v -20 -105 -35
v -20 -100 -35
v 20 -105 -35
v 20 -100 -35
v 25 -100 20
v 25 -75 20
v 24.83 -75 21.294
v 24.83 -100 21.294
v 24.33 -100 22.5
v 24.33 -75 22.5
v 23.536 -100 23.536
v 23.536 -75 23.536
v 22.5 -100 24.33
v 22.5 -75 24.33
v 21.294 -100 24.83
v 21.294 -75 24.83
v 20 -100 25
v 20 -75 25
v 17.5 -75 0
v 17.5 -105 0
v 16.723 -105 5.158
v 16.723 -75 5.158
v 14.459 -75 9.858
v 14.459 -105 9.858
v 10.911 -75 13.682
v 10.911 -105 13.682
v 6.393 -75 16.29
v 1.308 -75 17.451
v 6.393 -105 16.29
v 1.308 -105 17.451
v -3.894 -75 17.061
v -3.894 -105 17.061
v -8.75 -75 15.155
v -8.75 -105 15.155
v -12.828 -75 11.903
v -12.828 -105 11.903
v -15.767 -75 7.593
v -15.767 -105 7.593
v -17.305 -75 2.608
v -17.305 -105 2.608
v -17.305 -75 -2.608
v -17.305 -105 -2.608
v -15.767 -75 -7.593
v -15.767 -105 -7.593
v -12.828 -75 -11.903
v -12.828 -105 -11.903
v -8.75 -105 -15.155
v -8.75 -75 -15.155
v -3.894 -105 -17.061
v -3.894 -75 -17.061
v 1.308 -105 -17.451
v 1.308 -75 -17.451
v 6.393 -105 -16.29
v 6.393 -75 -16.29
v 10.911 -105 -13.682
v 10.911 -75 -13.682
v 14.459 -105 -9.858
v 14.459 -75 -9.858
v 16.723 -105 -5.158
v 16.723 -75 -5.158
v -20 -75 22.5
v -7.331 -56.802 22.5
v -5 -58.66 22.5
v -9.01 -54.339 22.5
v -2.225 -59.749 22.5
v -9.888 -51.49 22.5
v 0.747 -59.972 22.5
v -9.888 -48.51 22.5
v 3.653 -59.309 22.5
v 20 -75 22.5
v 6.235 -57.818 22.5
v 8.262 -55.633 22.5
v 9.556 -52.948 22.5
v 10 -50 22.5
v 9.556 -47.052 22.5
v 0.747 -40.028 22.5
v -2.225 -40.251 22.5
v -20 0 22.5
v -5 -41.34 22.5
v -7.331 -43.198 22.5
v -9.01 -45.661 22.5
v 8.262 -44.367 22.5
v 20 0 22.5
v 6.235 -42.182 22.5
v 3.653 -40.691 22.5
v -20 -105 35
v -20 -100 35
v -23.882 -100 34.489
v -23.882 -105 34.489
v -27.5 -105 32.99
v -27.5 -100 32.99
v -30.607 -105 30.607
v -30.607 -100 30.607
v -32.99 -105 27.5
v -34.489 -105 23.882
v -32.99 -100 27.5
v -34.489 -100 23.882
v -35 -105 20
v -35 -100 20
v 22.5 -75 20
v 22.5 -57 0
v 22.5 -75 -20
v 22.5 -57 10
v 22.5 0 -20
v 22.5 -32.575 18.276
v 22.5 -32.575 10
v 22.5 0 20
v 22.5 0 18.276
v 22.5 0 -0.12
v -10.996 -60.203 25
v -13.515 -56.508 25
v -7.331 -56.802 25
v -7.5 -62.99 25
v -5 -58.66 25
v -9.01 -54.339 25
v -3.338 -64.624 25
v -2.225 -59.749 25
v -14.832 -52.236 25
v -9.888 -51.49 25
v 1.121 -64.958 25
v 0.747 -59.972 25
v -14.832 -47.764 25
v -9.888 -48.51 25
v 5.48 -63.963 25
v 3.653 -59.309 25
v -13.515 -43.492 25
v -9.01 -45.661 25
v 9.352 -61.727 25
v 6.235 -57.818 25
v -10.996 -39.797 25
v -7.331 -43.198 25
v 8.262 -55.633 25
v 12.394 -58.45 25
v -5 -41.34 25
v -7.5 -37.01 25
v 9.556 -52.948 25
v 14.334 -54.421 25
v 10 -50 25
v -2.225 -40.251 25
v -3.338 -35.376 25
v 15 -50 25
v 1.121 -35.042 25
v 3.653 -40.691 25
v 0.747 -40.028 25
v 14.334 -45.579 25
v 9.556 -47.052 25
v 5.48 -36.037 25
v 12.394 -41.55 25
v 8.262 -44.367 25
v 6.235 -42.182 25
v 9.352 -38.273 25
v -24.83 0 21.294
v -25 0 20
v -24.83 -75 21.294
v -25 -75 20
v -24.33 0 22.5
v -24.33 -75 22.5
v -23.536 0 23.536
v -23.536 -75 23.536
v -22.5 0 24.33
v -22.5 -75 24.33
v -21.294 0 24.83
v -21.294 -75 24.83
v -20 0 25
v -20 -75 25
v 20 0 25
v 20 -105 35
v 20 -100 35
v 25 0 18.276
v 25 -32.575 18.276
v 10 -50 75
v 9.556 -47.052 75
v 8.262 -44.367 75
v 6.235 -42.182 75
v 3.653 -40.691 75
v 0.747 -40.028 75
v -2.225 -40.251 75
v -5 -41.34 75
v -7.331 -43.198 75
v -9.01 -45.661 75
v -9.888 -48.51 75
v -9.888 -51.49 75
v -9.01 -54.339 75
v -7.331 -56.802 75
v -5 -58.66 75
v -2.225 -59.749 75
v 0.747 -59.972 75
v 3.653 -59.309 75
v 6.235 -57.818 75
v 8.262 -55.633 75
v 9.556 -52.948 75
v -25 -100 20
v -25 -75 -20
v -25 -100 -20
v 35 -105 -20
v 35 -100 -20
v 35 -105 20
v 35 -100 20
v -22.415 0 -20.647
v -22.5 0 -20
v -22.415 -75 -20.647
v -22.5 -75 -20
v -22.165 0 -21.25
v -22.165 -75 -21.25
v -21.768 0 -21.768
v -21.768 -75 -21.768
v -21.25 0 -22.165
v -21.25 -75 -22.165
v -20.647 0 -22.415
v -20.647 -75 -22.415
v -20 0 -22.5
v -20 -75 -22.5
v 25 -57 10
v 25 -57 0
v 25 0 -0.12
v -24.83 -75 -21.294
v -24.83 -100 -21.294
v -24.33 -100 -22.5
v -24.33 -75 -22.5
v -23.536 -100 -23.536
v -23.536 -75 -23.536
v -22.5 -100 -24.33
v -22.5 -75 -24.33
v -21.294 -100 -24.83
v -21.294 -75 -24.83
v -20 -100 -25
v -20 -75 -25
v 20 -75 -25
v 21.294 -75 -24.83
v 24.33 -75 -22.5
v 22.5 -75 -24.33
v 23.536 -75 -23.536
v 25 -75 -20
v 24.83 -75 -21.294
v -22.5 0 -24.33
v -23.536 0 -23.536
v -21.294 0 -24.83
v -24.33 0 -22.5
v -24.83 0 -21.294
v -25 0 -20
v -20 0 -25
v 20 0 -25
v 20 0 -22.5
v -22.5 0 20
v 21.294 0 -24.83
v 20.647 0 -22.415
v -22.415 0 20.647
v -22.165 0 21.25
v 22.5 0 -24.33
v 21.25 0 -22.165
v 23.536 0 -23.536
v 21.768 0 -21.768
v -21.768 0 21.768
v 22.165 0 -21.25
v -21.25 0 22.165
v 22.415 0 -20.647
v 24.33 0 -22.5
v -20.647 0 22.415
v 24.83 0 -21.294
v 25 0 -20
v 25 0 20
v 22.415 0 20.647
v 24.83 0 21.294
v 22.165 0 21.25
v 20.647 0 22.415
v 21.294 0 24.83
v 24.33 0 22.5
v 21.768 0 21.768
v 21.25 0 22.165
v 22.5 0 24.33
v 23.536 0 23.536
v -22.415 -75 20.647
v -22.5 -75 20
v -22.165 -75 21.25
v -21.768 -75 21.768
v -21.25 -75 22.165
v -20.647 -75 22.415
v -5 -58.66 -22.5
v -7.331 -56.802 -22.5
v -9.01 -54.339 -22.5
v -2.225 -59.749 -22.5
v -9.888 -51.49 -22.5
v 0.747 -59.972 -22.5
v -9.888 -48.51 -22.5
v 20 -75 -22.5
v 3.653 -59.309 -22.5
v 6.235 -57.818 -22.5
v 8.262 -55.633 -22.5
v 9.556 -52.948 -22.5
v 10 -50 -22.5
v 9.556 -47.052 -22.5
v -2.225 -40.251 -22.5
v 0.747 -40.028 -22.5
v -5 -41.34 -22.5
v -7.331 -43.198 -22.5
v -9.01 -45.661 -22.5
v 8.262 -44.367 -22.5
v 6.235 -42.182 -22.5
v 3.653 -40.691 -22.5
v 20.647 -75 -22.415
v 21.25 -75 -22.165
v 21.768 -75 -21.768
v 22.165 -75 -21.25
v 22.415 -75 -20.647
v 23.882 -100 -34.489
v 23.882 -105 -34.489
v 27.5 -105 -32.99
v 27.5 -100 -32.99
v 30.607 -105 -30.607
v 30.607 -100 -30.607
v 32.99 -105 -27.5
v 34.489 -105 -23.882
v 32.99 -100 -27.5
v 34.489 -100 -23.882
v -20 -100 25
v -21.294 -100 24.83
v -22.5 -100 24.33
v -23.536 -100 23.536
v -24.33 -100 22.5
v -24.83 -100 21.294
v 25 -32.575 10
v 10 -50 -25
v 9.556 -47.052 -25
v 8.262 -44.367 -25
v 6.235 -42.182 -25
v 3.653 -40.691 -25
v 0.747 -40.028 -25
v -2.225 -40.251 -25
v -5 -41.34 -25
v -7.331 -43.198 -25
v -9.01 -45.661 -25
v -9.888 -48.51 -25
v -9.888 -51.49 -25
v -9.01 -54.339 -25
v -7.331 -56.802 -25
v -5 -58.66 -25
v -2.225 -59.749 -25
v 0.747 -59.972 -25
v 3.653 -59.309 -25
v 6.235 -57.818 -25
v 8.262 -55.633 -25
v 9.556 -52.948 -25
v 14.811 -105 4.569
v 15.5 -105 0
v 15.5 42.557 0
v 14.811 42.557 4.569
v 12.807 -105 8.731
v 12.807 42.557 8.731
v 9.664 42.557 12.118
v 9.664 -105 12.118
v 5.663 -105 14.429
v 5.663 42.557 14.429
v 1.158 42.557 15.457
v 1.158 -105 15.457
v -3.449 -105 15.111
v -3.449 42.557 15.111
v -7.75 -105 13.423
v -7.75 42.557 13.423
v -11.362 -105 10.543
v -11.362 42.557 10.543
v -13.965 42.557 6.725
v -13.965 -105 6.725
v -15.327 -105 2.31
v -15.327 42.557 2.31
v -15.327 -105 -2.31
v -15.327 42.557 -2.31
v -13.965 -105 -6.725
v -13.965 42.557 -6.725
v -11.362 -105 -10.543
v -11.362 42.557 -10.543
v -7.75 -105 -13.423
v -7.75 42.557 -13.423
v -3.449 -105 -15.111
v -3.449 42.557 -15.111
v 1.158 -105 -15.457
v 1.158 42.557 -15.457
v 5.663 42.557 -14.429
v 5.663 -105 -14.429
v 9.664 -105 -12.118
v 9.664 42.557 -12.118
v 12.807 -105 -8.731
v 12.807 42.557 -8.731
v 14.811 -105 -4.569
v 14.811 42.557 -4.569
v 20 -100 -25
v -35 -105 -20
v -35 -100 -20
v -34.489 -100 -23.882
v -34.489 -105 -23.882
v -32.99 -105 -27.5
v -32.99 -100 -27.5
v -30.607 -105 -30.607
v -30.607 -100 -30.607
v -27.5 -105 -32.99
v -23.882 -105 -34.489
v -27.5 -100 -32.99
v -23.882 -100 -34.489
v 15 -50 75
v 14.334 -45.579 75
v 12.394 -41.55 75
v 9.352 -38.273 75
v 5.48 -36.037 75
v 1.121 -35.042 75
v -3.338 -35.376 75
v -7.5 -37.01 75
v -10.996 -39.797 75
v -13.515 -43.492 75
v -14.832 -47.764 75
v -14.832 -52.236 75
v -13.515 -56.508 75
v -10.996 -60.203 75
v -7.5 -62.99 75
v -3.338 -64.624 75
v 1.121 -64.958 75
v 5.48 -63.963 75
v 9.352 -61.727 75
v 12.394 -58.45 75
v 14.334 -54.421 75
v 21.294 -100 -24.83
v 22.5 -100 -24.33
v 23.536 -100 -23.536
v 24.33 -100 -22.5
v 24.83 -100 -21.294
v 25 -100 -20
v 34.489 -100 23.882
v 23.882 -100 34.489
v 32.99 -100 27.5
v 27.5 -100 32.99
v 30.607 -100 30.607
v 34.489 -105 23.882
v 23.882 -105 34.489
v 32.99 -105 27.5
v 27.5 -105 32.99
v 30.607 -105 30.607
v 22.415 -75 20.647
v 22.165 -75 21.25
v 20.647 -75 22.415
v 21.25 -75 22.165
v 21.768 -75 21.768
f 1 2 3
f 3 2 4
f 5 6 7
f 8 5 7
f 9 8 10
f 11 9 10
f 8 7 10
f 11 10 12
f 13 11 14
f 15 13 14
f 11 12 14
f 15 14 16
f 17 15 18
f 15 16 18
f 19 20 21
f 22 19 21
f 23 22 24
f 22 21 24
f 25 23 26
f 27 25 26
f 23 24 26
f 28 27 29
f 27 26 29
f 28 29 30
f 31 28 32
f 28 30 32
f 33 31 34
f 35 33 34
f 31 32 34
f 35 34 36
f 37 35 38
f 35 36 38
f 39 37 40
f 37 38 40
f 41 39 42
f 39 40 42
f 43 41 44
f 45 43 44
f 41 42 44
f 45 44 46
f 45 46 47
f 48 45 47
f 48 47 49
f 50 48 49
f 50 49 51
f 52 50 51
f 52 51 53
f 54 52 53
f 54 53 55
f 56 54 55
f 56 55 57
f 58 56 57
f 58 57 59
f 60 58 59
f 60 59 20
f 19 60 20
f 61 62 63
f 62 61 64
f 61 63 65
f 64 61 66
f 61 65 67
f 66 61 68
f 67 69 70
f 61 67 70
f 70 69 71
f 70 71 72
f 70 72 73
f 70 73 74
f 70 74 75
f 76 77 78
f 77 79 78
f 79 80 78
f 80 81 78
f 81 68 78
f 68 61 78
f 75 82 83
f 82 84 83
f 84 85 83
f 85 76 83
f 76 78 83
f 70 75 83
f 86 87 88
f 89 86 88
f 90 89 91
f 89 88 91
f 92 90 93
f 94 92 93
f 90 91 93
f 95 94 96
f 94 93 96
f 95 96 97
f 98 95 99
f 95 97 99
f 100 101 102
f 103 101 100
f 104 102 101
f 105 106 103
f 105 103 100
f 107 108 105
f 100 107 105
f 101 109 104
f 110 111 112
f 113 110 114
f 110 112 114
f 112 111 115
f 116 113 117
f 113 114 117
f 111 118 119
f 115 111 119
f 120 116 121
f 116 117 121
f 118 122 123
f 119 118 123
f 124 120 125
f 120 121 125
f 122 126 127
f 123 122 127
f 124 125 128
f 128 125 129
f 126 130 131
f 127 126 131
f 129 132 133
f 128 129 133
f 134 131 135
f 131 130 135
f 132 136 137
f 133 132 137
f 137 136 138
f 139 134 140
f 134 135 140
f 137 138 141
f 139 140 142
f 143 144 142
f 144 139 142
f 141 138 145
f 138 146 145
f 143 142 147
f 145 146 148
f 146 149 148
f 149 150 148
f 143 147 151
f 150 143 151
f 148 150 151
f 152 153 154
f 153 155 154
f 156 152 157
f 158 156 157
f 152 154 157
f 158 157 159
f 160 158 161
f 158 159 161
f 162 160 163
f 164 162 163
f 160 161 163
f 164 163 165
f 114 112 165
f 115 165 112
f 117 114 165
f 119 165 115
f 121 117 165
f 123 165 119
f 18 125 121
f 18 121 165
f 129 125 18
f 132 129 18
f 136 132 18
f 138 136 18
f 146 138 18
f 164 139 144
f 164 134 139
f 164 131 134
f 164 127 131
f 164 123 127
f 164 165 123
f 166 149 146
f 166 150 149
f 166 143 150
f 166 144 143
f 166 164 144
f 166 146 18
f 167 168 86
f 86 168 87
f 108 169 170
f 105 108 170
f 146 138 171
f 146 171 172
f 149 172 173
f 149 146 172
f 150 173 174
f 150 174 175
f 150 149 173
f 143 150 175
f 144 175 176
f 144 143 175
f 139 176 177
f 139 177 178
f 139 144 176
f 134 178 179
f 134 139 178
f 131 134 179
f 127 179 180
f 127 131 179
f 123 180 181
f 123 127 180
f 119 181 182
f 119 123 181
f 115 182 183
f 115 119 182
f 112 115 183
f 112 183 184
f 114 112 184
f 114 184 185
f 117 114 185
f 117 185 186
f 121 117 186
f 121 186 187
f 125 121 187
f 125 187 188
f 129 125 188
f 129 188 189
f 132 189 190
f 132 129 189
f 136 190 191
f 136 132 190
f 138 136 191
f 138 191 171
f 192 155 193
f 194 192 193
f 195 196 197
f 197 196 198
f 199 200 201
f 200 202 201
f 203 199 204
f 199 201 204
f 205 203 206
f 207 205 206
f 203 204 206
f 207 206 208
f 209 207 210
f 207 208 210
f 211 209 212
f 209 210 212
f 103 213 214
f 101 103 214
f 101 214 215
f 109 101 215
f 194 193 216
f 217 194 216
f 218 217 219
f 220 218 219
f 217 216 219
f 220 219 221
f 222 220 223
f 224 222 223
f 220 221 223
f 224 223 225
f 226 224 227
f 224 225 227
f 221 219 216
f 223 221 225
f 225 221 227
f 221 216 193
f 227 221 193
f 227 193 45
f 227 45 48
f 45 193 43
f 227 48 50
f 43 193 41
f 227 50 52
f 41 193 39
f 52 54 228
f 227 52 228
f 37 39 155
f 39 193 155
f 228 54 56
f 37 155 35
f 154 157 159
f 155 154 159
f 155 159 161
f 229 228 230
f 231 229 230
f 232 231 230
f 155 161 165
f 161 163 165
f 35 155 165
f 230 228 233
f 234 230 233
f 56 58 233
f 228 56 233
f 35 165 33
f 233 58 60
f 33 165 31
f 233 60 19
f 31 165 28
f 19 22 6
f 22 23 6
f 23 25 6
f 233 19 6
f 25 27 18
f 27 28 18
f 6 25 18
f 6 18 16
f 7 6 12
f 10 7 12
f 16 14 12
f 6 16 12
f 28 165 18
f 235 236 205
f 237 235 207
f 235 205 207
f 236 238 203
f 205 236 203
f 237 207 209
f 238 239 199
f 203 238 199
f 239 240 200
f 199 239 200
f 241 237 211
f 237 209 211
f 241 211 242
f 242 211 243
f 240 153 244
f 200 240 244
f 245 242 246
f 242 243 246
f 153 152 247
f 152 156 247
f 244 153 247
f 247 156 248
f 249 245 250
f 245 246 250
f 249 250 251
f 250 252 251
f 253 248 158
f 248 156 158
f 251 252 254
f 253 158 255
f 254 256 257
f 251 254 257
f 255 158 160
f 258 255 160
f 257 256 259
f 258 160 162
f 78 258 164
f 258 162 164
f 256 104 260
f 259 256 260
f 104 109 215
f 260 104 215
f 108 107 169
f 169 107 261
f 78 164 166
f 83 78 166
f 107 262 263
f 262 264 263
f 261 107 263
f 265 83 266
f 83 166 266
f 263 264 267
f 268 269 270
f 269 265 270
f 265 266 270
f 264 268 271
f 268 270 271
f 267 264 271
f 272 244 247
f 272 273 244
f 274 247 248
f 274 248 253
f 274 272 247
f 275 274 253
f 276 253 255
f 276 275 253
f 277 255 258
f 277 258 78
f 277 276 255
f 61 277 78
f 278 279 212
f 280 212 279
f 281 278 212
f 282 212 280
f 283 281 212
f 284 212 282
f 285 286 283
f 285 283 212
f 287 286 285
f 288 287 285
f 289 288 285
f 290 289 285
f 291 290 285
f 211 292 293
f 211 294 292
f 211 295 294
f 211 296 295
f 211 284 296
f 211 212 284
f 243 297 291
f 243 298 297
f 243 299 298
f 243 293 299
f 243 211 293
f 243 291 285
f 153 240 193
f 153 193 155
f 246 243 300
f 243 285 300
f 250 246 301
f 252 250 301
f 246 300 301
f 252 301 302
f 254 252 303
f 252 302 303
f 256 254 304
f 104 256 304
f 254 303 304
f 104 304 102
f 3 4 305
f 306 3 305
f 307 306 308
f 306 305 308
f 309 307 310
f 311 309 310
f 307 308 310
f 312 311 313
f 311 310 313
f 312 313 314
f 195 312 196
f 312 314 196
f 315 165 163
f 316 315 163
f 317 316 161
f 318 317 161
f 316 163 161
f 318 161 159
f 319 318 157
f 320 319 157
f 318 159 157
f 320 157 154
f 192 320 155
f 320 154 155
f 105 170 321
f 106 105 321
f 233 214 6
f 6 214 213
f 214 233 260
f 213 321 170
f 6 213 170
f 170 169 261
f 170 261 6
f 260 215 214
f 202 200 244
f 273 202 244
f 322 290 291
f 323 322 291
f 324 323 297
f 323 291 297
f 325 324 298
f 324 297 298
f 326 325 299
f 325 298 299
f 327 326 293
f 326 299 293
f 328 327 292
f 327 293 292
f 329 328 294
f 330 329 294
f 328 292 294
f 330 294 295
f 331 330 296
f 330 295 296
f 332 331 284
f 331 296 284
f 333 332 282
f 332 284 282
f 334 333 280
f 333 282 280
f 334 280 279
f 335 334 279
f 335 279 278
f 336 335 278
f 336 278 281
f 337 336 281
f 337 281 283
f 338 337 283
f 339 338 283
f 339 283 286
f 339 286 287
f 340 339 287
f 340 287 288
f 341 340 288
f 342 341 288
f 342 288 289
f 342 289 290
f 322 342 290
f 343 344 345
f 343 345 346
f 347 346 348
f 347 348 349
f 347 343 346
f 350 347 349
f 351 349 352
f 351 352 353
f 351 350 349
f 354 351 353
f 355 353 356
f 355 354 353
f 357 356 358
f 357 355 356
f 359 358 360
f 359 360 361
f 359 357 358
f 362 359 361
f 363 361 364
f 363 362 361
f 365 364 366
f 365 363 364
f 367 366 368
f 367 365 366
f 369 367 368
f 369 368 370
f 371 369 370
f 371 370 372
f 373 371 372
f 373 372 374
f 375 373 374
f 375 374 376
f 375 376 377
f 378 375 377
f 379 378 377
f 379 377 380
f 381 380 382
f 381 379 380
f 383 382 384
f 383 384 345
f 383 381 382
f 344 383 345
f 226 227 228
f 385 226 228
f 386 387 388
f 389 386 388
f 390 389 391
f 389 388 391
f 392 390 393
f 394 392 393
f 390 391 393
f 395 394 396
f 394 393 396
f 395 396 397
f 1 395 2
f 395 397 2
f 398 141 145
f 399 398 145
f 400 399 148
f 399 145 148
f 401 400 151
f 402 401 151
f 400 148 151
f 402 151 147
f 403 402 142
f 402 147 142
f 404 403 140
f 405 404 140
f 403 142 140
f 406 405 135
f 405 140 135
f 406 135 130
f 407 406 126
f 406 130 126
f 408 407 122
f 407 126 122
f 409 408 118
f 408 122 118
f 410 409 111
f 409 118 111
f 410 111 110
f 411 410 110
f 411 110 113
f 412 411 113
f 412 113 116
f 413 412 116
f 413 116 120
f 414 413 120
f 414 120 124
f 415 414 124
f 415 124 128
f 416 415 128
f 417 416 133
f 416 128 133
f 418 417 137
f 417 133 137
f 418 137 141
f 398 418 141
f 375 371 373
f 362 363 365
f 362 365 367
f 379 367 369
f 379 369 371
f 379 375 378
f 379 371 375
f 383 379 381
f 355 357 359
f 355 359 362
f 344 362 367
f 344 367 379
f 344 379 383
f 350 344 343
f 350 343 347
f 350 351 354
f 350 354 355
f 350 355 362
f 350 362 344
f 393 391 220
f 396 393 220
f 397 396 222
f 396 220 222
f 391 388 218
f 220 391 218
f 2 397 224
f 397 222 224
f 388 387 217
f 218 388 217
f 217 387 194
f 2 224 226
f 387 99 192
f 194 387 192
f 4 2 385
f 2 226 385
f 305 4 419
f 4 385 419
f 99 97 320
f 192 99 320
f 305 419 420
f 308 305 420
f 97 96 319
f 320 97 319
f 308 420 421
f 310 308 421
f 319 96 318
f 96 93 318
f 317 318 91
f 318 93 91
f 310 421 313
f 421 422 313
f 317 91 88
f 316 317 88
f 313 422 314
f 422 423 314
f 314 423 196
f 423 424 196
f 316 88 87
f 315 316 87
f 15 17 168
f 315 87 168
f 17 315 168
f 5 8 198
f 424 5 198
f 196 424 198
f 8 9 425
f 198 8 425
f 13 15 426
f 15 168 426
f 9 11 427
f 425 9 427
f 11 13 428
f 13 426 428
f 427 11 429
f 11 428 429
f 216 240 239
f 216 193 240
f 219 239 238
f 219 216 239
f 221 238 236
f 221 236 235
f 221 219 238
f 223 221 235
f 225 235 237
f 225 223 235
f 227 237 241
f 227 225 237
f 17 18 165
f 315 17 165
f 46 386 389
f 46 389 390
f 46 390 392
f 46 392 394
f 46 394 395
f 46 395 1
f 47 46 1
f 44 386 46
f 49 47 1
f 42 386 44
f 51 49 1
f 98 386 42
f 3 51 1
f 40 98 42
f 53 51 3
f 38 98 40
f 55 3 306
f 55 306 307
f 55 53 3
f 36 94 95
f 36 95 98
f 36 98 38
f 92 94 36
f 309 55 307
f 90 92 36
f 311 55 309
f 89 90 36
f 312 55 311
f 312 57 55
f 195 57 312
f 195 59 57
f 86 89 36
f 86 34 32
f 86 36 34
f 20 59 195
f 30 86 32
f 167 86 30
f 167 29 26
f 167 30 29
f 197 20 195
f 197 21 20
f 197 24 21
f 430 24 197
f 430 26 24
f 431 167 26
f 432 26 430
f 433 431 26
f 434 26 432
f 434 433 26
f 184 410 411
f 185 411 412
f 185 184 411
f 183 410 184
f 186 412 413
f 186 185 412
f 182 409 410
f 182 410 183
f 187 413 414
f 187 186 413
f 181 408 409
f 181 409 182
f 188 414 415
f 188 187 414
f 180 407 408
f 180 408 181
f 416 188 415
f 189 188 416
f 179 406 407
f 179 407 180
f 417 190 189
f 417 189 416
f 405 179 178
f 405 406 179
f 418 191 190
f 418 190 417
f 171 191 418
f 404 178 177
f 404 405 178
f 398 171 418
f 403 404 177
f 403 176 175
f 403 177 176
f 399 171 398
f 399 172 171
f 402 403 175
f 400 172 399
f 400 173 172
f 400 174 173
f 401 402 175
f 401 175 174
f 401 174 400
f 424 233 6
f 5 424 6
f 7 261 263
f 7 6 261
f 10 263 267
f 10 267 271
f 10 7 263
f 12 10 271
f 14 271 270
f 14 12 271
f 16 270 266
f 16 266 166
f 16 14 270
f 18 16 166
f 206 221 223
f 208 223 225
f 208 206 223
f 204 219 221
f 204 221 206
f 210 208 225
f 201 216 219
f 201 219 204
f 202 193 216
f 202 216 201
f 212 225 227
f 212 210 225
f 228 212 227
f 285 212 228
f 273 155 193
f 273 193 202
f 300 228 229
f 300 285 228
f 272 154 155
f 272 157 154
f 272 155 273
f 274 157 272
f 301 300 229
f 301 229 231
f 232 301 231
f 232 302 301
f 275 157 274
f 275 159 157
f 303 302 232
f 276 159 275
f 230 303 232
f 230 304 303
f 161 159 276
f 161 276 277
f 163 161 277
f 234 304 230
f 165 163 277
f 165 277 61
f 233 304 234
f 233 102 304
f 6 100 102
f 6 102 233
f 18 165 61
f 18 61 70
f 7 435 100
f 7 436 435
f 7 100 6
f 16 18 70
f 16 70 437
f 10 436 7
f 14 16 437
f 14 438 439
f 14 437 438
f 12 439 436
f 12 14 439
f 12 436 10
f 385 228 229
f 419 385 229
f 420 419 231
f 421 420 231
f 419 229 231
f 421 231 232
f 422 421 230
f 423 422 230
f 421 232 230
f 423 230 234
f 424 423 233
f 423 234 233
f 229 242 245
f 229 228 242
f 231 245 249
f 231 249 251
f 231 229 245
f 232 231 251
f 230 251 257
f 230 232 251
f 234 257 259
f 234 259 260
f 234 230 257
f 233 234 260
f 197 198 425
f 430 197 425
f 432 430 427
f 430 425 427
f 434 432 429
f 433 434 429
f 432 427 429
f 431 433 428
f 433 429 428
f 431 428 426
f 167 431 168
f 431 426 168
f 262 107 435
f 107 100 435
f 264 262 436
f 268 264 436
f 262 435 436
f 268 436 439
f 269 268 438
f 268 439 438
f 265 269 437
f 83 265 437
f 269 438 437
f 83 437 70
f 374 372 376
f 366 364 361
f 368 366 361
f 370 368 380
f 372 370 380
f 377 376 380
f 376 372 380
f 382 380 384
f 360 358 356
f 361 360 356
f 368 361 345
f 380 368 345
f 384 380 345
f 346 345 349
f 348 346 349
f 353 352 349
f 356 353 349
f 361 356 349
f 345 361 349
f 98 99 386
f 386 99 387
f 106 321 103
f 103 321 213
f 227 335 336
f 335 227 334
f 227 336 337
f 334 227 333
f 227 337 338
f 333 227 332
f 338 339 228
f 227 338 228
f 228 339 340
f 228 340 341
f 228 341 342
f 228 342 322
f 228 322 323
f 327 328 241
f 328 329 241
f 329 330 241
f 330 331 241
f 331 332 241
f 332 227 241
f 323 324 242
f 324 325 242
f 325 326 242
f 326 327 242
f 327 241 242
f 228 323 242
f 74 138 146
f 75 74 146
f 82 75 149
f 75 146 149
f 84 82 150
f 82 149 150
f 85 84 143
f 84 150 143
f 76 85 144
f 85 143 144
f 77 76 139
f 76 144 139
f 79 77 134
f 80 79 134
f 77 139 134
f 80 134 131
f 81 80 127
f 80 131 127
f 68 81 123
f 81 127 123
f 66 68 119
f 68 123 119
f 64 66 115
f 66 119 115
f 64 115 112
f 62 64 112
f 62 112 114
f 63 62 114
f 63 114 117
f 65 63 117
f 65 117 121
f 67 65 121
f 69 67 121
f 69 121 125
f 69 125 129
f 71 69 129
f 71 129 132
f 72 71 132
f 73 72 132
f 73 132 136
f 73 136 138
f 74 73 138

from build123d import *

# Parameters (mm, degrees)
F0_W      = 50
F0_H      = 50
F1_DEPTH  = 75
F2_R      = 5
F3_T      = -2.5
F4_R      = 10
F5_DEPTH  = 50.001
F7_DEPTH  = 3
F9_DEPTH  = 25
F11_DEPTH = 5
F12_R     = 17.5
F13_DEPTH = 105.001
F14_R     = 15.5
F15_DEPTH = 147.557229
F16_R     = 15
F16_R_2   = 10
F17_DEPTH = 50


with BuildPart() as f1:
    # F0 (on Front) → F1 (new body)
    with BuildSketch(Plane.XZ):
        Rectangle(F0_W, F0_H)
    extrude(amount=F1_DEPTH)

    # F2
    f2_edges = [f1.edges().sort_by_distance(p)[0] for p in [
        (-25, -37.5, -25),
        (25, -37.5, -25),
        (-25, -37.5, 25),
        (25, -37.5, 25),
    ]]
    fillet(f2_edges, radius=F2_R)

    # F3
    f3_openings = [f1.faces().sort_by_distance(p)[0] for p in [
        (0, -75, 0),
        (0, 0, 0),
    ]]
    offset(amount=F3_T, openings=f3_openings)

    # F4 (on face) → F5 (cut, through all)
    with BuildSketch(Plane.XY.offset(25)):
        with Locations((0, -50)):
            Circle(F4_R)
    extrude(amount=-F5_DEPTH, mode=Mode.SUBTRACT)

    # F6 (on face) → F7 (cut)
    with BuildSketch(Plane.YZ.offset(25)):
        Polygon((-57, 10), (-57, 0), (0, -0.119625), (0, 18.276277), (-32.574555, 18.276277), (-32.574555, 10), align=None)
    extrude(amount=-F7_DEPTH, mode=Mode.SUBTRACT)


with BuildPart() as f9:
    # F8 (on face) → F9 (new body)
    with BuildSketch(Plane.XZ.offset(75)):
        with BuildLine():
            ThreePointArc((25, 20), (23.535534, 23.535534), (20, 25))
            Line((20, 25), (-20, 25))
            ThreePointArc((-20, 25), (-23.535534, 23.535534), (-25, 20))
            Line((-25, 20), (-25, -20))
            ThreePointArc((-25, -20), (-23.535534, -23.535534), (-20, -25))
            Line((-20, -25), (20, -25))
            ThreePointArc((20, -25), (23.535534, -23.535534), (25, -20))
            Line((25, -20), (25, 20))
        make_face()
    extrude(amount=F9_DEPTH)

    # F10 (on face) → F11 (join)
    with BuildSketch(Plane.XZ.offset(100)):
        with BuildLine():
            Line((35, -20), (35, 20))
            ThreePointArc((35, 20), (30.606602, 30.606602), (20, 35))
            Line((20, 35), (-20, 35))
            ThreePointArc((-20, 35), (-30.606602, 30.606602), (-35, 20))
            Line((-35, 20), (-35, -20))
            ThreePointArc((-35, -20), (-30.606602, -30.606602), (-20, -35))
            Line((-20, -35), (20, -35))
            ThreePointArc((20, -35), (30.606602, -30.606602), (35, -20))
        make_face()
    extrude(amount=F11_DEPTH)

    # F12 (on face) → F13 (cut, through all)
    with BuildSketch(Plane.XZ.offset(105)):
        Circle(F12_R)
    extrude(amount=-F13_DEPTH, mode=Mode.SUBTRACT)


with BuildPart() as f15:
    # F14 (on face) → F15 (new body)
    with BuildSketch(Plane.XZ.offset(105)):
        Circle(F14_R)
    extrude(amount=-F15_DEPTH)


with BuildPart() as f17:
    # F16 (on face) → F17 (new body)
    with BuildSketch(Plane.XY.offset(25)):
        with Locations((0, -50)):
            Circle(F16_R)
        with Locations((0, -50)):
            Circle(F16_R_2, mode=Mode.SUBTRACT)
    extrude(amount=F17_DEPTH)


solid = Compound([f1.part, f9.part, f15.part, f17.part])
